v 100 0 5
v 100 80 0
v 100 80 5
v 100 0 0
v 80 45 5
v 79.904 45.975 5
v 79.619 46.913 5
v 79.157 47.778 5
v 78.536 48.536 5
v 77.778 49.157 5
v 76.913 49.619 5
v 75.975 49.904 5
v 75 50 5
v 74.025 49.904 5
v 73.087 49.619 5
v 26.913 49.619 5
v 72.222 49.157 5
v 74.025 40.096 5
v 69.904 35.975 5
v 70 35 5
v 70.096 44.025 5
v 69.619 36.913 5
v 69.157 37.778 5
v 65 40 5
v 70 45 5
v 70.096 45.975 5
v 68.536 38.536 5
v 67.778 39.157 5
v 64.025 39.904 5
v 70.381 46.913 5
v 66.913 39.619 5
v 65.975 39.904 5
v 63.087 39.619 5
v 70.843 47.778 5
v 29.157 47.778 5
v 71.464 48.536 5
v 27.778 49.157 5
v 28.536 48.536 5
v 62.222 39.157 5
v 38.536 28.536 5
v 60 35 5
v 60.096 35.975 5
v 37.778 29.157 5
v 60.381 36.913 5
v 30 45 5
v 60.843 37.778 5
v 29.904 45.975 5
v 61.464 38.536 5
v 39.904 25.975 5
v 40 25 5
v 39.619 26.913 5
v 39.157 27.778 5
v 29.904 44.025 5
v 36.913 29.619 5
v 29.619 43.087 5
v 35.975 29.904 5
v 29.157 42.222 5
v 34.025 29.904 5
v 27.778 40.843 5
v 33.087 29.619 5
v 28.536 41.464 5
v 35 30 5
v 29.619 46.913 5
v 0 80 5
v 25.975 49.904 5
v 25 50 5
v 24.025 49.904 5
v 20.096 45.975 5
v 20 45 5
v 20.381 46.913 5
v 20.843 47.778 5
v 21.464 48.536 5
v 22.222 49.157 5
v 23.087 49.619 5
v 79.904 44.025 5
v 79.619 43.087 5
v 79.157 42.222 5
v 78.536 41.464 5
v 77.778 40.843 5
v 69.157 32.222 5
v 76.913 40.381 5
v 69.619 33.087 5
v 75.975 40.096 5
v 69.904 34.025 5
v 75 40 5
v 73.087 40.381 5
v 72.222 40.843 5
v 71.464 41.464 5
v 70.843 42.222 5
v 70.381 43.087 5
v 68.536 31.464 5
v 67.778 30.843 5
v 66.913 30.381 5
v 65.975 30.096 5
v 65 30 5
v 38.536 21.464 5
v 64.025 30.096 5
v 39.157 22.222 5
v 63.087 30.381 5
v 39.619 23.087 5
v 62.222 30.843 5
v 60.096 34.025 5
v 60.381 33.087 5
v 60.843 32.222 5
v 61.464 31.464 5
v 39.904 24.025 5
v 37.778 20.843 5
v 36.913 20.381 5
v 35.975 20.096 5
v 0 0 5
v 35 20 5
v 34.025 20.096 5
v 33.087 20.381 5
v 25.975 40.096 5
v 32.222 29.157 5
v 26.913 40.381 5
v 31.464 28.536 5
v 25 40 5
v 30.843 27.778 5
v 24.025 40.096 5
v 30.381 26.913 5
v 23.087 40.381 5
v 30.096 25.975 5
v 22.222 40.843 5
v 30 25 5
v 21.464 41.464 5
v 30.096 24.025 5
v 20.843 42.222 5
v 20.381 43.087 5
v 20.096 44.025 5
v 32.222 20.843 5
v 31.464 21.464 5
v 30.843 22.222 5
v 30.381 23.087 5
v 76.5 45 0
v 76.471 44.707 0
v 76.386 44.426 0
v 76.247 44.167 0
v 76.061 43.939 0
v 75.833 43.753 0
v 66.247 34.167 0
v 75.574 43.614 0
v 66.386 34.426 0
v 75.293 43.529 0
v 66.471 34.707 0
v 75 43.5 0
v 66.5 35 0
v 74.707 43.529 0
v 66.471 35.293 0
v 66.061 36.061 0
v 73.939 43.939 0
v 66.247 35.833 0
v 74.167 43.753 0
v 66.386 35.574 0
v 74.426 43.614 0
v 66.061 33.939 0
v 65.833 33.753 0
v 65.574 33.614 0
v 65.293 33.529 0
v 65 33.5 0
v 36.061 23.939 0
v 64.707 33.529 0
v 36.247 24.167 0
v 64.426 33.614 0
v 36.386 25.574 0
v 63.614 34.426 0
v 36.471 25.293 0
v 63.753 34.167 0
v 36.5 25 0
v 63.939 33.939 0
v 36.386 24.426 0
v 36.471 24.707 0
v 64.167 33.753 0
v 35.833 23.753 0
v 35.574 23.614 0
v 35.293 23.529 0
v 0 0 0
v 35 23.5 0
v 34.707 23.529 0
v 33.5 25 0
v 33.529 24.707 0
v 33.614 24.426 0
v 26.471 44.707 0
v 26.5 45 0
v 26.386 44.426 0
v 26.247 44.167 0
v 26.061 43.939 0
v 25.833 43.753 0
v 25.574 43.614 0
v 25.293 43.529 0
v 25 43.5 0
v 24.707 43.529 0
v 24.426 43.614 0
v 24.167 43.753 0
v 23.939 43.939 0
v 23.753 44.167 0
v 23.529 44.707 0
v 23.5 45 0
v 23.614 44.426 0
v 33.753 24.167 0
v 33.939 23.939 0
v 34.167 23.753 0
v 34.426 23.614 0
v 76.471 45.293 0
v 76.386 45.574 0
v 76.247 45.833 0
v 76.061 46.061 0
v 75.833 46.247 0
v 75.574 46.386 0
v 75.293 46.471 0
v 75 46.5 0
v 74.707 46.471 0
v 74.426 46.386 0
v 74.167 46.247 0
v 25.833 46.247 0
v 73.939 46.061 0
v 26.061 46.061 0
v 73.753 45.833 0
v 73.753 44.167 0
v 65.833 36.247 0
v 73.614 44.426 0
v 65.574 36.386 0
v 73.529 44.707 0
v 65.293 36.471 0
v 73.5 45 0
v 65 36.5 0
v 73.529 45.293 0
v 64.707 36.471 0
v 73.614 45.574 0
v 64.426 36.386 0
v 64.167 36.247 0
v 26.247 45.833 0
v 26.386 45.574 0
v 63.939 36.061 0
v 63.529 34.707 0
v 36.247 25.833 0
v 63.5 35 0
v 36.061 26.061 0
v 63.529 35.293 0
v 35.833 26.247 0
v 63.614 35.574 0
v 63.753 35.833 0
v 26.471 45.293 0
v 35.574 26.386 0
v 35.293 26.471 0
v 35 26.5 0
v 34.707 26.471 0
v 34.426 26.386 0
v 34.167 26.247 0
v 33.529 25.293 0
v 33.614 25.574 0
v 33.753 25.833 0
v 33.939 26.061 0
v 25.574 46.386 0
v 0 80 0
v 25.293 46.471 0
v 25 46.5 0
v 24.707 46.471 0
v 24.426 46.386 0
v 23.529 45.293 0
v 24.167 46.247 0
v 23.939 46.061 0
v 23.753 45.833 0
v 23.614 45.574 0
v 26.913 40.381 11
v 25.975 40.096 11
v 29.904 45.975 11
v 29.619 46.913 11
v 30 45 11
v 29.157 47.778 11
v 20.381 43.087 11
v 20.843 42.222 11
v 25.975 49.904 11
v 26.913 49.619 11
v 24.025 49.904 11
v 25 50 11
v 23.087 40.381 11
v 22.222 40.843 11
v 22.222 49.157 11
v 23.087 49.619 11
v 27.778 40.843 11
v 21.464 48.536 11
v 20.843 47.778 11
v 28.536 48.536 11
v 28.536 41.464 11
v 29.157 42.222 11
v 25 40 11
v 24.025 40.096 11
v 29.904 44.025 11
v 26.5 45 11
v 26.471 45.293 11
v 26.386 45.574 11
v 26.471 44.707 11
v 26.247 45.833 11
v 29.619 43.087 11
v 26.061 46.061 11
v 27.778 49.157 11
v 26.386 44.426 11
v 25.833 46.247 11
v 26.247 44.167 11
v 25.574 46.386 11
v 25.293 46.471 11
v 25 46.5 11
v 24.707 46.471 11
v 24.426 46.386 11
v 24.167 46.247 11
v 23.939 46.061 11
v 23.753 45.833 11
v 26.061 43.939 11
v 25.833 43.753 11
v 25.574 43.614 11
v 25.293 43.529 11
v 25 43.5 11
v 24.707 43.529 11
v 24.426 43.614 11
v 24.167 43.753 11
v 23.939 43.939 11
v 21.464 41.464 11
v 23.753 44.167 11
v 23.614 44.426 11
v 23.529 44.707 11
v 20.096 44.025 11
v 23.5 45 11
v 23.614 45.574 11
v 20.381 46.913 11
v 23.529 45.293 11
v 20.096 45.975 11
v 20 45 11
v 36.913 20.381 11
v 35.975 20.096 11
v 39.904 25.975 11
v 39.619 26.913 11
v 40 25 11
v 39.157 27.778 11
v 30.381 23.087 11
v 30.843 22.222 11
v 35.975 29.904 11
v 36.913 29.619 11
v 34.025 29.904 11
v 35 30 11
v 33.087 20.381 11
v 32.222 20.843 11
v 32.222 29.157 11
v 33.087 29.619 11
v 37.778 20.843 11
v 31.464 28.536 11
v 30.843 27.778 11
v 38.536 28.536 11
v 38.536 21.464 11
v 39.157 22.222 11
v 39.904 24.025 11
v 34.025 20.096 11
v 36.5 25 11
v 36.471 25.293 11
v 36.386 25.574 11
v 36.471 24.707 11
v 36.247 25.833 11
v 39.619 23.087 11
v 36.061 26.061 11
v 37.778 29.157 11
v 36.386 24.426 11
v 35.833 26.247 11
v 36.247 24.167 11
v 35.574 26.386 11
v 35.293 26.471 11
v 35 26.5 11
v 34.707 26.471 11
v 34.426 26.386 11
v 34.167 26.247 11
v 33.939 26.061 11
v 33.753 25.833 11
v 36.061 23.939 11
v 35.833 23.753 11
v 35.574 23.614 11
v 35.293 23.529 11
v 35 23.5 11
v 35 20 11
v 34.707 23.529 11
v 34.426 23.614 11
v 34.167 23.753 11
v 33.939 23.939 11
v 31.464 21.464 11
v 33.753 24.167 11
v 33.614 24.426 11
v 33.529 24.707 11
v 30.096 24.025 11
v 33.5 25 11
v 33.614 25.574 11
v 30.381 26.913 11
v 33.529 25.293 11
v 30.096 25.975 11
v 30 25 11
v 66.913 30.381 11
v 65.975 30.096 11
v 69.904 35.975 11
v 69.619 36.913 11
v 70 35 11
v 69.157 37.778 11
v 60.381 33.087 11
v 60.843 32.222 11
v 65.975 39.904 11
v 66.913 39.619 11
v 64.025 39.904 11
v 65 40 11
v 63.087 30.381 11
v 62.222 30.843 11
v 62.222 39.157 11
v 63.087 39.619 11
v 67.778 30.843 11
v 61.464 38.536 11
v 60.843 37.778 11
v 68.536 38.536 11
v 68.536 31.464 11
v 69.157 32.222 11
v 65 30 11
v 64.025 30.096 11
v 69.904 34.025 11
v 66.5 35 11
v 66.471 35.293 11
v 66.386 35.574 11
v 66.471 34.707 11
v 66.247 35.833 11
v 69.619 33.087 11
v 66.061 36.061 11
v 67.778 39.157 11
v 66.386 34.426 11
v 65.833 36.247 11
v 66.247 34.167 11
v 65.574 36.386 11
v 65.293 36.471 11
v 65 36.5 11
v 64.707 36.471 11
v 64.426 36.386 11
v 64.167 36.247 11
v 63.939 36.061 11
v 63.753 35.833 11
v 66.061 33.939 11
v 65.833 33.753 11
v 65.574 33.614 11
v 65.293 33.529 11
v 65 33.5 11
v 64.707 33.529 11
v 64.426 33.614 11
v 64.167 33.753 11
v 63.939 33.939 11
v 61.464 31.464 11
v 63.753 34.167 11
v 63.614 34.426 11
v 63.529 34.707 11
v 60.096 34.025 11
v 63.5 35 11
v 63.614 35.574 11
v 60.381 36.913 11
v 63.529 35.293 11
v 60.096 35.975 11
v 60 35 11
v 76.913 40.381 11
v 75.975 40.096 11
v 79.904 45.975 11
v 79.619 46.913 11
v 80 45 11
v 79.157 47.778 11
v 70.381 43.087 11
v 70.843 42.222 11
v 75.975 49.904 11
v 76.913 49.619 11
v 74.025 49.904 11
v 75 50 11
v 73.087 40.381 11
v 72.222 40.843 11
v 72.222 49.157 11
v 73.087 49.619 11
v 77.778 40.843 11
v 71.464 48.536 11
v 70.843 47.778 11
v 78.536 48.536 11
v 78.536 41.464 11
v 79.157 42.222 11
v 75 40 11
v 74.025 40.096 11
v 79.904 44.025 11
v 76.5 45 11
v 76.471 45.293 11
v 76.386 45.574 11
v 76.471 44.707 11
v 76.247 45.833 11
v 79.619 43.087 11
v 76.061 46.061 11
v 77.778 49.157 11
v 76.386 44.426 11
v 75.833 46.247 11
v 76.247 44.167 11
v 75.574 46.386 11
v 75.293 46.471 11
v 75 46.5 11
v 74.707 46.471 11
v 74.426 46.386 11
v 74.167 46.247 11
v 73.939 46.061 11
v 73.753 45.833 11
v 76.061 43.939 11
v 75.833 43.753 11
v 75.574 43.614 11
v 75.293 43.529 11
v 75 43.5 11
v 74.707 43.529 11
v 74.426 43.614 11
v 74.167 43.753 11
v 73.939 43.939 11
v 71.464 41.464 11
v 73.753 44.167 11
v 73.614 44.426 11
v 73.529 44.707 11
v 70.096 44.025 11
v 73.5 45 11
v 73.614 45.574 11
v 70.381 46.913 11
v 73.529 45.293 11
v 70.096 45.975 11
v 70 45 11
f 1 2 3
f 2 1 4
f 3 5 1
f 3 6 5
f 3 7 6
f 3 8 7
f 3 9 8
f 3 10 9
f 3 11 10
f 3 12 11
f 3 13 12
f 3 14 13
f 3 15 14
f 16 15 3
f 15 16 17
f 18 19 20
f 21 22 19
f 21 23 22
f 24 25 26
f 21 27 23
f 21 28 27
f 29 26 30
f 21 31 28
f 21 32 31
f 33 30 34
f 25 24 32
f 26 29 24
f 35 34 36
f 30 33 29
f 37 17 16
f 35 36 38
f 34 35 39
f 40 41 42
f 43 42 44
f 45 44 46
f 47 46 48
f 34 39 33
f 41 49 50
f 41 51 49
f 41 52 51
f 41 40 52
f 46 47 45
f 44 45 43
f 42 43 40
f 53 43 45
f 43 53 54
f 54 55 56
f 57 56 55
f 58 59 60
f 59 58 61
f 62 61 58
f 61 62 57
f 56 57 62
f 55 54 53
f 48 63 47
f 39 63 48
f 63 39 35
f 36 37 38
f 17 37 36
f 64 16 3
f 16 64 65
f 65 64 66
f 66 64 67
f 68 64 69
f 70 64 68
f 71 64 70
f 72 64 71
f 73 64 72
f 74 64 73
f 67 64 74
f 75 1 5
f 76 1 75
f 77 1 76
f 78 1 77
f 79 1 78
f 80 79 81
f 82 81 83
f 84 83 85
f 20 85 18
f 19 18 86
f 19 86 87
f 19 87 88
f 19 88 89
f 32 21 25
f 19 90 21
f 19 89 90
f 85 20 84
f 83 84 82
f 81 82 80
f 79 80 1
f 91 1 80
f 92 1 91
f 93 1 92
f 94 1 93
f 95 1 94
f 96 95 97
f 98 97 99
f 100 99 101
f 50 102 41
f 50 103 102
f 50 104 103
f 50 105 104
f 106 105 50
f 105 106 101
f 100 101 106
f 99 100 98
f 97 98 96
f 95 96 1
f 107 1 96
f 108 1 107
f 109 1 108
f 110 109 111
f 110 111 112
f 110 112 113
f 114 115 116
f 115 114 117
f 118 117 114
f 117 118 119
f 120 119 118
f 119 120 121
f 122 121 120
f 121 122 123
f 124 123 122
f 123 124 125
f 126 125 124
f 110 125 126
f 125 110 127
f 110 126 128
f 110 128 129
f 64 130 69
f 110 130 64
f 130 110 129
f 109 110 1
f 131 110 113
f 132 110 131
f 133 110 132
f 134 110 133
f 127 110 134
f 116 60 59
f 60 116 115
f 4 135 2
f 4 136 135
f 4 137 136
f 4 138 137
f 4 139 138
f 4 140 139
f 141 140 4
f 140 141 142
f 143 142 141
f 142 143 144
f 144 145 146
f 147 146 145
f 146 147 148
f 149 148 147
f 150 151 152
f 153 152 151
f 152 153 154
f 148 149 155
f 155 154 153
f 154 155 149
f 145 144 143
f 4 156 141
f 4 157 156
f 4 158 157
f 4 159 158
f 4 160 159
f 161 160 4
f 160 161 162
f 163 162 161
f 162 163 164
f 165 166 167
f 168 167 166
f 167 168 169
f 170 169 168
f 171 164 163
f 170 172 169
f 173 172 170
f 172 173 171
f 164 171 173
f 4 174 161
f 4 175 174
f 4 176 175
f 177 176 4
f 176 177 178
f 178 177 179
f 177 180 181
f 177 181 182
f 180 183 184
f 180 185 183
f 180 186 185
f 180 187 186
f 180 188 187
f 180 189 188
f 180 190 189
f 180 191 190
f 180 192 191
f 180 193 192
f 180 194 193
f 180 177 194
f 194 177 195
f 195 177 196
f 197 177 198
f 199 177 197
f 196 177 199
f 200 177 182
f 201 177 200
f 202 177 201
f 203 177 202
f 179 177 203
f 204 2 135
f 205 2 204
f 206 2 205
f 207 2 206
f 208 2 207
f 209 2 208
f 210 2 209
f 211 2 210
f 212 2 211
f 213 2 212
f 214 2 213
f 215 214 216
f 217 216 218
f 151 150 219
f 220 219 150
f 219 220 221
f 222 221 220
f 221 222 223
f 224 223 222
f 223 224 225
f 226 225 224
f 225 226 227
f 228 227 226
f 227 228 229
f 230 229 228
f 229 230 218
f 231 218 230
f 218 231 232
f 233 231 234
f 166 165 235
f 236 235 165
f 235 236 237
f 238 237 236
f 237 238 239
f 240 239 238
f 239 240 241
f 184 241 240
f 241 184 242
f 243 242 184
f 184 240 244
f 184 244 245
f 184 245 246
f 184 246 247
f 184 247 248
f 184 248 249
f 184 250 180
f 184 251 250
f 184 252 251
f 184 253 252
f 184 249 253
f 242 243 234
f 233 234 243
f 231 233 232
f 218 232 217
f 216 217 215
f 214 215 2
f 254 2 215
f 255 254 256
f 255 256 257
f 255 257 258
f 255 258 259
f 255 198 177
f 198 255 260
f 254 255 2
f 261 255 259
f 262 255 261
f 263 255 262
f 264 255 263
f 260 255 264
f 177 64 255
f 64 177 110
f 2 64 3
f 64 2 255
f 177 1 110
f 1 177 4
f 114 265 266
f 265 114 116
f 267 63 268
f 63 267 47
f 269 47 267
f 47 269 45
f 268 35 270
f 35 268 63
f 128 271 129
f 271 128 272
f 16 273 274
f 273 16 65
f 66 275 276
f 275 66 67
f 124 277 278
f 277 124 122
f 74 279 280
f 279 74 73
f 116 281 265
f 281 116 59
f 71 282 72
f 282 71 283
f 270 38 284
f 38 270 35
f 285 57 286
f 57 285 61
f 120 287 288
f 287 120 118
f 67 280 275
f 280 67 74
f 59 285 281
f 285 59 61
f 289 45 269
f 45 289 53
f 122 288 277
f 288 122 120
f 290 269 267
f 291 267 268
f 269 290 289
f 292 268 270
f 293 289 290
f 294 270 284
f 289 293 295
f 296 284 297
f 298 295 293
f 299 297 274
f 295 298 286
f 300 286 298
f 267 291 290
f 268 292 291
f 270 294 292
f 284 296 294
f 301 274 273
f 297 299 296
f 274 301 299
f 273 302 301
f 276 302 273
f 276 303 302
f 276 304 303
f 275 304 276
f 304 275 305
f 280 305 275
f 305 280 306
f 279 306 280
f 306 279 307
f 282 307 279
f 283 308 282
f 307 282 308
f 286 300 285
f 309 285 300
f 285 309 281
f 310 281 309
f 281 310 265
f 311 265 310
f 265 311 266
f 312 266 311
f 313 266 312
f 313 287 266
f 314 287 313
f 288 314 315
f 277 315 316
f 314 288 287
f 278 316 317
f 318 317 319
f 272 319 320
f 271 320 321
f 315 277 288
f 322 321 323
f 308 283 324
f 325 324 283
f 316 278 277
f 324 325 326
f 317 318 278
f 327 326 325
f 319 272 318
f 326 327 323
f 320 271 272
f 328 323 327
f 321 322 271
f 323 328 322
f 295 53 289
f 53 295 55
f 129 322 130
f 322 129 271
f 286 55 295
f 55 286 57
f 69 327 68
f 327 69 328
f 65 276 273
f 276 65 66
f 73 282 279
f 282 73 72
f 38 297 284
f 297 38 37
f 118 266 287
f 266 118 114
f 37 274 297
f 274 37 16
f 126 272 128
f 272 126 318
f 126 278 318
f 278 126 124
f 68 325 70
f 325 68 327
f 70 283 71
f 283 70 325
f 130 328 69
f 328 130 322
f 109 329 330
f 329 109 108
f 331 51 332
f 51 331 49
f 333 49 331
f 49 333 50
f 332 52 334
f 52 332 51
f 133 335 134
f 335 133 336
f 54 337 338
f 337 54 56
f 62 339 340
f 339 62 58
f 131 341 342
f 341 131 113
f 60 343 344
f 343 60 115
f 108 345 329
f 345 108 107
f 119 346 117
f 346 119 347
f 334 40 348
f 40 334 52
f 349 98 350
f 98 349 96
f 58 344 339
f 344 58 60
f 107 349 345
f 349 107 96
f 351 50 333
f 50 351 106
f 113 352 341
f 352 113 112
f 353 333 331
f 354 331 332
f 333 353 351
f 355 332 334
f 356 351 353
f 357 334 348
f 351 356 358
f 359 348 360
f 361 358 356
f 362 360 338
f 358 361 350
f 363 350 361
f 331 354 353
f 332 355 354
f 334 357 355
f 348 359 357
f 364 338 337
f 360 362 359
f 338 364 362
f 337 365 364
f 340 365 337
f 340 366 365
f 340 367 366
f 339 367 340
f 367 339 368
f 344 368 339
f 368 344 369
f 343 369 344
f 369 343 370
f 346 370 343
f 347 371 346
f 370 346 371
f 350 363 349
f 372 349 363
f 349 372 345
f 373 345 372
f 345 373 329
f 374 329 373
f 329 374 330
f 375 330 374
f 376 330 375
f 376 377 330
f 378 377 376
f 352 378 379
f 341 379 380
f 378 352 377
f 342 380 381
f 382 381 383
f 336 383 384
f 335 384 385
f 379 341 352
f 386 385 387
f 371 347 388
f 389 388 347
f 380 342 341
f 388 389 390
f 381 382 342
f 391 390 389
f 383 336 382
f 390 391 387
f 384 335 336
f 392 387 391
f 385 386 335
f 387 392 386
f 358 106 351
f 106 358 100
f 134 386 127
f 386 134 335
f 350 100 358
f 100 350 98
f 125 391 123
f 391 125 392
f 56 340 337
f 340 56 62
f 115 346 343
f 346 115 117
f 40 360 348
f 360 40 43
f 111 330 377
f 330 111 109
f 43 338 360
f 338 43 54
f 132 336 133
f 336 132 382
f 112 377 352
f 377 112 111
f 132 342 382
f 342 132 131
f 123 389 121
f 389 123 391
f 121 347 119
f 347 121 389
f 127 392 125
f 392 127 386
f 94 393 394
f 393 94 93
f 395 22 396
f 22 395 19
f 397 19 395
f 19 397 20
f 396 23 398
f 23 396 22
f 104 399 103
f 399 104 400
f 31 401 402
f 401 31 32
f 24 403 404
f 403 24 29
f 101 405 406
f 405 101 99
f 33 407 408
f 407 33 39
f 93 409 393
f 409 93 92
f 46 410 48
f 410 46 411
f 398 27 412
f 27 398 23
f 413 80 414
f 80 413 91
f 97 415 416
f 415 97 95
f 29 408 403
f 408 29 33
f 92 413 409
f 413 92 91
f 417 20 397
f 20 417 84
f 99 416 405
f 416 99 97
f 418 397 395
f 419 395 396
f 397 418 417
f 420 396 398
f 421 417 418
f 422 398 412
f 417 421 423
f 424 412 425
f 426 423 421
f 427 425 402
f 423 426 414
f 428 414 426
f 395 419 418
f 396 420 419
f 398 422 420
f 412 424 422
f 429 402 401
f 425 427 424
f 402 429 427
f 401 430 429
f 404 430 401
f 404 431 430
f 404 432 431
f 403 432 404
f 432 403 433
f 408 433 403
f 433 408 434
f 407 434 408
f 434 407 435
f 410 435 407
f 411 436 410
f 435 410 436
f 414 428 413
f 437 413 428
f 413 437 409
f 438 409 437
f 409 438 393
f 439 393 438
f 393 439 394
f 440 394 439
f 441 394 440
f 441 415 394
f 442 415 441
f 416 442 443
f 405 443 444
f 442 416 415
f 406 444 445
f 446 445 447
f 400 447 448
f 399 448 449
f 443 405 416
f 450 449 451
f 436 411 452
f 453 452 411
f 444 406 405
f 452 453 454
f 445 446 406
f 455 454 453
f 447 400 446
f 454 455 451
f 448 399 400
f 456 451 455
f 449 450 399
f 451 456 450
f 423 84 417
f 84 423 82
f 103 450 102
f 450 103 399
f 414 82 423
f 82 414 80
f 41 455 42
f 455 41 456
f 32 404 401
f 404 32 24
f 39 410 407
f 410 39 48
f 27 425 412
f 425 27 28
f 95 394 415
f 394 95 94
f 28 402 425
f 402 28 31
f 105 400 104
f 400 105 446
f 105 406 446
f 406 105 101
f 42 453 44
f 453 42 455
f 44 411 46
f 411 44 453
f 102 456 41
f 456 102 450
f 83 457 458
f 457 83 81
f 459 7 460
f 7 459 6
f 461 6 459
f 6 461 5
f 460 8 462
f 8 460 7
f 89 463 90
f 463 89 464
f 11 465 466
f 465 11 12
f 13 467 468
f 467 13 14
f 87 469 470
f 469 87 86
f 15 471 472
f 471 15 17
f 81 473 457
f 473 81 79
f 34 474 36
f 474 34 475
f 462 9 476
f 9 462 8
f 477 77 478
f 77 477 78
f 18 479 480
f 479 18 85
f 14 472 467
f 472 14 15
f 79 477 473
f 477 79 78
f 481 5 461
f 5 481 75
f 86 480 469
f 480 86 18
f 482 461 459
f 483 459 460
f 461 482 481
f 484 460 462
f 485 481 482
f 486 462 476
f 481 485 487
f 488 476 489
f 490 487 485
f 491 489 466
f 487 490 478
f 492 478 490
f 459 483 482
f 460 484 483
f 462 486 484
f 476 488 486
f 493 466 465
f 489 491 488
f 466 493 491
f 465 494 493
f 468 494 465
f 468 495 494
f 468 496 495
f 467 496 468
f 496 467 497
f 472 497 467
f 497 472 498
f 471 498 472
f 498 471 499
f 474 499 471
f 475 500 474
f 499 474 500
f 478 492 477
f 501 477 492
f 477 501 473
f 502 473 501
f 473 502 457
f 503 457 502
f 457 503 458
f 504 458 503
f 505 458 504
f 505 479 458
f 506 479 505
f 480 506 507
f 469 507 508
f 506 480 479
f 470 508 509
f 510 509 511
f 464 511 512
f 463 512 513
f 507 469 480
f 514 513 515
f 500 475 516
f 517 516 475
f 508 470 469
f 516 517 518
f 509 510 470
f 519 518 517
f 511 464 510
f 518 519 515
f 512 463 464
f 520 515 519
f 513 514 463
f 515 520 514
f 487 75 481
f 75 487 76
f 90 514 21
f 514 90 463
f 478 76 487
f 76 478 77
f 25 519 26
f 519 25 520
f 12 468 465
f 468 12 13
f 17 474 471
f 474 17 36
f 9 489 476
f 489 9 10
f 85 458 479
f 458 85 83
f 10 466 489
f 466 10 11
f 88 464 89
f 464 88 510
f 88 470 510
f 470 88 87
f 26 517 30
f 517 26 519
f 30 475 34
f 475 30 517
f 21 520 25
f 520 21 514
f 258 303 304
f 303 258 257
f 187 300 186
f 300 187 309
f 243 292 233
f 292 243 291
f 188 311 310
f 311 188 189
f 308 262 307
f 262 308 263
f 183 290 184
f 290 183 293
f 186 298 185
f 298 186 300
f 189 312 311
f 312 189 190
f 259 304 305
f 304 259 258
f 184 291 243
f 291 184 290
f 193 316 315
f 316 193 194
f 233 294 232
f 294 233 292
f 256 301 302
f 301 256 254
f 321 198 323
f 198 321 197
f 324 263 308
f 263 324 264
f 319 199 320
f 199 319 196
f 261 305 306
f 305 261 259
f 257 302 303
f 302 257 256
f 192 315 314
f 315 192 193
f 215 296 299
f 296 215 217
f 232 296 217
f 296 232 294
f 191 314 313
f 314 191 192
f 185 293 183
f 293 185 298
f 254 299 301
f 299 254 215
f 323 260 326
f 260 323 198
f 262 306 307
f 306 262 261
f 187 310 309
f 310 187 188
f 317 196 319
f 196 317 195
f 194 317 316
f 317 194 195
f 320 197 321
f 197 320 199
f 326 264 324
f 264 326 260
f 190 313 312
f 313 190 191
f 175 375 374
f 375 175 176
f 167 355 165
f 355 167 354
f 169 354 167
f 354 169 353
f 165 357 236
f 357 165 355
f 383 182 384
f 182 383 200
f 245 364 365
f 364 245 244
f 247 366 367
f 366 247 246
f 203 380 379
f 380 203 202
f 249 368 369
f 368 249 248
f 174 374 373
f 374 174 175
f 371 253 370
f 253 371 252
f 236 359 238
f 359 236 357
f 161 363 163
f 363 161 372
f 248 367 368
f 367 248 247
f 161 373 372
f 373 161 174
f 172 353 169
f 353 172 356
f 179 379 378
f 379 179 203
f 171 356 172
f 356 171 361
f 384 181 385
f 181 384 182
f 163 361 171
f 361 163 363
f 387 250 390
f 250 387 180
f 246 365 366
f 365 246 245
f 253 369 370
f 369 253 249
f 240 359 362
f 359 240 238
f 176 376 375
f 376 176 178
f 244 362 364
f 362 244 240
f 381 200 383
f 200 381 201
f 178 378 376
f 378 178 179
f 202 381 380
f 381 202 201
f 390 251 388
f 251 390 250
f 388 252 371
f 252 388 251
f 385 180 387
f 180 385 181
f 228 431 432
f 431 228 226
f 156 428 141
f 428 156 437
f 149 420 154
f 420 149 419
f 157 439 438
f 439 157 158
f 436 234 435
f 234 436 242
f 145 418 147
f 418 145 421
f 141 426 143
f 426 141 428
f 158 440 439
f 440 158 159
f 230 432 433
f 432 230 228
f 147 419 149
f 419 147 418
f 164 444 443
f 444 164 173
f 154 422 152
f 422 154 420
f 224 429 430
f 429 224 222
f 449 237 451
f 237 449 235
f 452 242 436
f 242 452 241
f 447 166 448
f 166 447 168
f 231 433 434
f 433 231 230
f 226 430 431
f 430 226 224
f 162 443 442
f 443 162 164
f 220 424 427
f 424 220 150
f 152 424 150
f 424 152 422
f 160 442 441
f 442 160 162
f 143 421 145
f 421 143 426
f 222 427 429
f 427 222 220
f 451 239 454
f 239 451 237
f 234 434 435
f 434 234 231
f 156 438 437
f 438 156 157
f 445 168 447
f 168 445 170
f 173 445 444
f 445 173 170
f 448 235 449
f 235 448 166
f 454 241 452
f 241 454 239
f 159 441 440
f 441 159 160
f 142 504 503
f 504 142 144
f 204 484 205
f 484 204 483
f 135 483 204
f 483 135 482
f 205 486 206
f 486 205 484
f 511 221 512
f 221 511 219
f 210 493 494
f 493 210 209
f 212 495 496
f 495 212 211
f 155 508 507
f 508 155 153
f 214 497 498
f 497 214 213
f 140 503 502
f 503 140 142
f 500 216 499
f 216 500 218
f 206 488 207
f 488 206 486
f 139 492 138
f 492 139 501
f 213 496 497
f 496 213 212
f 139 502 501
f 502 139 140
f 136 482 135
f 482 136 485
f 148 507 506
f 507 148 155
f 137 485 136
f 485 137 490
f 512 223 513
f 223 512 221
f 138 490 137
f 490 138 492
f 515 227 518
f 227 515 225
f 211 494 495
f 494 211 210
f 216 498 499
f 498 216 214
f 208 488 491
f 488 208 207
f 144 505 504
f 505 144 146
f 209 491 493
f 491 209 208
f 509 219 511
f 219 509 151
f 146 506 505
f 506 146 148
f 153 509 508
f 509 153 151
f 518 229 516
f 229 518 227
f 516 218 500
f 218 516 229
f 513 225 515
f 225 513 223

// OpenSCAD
$fn = 32;

// ----------------------------------------------------------------------
// Boss field: plate with bosses at given coordinates
// ----------------------------------------------------------------------

// --- parameters (mm) ---
plate_l = 100;            // plate length, X
plate_w = 80;             // plate width, Y
plate_t = 5;              // plate thickness, Z
boss_d = 10;              // boss diameter
boss_h = 6;               // boss height above the plate
bore_d = 3;               // boss bore

total_h = plate_t + boss_h;  // overall height

difference() {
  union() {
    cube([plate_l, plate_w, plate_t]);
    translate([25, 45, plate_t]) cylinder(h = boss_h, d = boss_d);
    translate([35, 25, plate_t]) cylinder(h = boss_h, d = boss_d);
    translate([65, 35, plate_t]) cylinder(h = boss_h, d = boss_d);
    translate([75, 45, plate_t]) cylinder(h = boss_h, d = boss_d);
  }
  translate([25, 45, -1]) cylinder(h = total_h + 2, d = bore_d);
  translate([35, 25, -1]) cylinder(h = total_h + 2, d = bore_d);
  translate([65, 35, -1]) cylinder(h = total_h + 2, d = bore_d);
  translate([75, 45, -1]) cylinder(h = total_h + 2, d = bore_d);
}
